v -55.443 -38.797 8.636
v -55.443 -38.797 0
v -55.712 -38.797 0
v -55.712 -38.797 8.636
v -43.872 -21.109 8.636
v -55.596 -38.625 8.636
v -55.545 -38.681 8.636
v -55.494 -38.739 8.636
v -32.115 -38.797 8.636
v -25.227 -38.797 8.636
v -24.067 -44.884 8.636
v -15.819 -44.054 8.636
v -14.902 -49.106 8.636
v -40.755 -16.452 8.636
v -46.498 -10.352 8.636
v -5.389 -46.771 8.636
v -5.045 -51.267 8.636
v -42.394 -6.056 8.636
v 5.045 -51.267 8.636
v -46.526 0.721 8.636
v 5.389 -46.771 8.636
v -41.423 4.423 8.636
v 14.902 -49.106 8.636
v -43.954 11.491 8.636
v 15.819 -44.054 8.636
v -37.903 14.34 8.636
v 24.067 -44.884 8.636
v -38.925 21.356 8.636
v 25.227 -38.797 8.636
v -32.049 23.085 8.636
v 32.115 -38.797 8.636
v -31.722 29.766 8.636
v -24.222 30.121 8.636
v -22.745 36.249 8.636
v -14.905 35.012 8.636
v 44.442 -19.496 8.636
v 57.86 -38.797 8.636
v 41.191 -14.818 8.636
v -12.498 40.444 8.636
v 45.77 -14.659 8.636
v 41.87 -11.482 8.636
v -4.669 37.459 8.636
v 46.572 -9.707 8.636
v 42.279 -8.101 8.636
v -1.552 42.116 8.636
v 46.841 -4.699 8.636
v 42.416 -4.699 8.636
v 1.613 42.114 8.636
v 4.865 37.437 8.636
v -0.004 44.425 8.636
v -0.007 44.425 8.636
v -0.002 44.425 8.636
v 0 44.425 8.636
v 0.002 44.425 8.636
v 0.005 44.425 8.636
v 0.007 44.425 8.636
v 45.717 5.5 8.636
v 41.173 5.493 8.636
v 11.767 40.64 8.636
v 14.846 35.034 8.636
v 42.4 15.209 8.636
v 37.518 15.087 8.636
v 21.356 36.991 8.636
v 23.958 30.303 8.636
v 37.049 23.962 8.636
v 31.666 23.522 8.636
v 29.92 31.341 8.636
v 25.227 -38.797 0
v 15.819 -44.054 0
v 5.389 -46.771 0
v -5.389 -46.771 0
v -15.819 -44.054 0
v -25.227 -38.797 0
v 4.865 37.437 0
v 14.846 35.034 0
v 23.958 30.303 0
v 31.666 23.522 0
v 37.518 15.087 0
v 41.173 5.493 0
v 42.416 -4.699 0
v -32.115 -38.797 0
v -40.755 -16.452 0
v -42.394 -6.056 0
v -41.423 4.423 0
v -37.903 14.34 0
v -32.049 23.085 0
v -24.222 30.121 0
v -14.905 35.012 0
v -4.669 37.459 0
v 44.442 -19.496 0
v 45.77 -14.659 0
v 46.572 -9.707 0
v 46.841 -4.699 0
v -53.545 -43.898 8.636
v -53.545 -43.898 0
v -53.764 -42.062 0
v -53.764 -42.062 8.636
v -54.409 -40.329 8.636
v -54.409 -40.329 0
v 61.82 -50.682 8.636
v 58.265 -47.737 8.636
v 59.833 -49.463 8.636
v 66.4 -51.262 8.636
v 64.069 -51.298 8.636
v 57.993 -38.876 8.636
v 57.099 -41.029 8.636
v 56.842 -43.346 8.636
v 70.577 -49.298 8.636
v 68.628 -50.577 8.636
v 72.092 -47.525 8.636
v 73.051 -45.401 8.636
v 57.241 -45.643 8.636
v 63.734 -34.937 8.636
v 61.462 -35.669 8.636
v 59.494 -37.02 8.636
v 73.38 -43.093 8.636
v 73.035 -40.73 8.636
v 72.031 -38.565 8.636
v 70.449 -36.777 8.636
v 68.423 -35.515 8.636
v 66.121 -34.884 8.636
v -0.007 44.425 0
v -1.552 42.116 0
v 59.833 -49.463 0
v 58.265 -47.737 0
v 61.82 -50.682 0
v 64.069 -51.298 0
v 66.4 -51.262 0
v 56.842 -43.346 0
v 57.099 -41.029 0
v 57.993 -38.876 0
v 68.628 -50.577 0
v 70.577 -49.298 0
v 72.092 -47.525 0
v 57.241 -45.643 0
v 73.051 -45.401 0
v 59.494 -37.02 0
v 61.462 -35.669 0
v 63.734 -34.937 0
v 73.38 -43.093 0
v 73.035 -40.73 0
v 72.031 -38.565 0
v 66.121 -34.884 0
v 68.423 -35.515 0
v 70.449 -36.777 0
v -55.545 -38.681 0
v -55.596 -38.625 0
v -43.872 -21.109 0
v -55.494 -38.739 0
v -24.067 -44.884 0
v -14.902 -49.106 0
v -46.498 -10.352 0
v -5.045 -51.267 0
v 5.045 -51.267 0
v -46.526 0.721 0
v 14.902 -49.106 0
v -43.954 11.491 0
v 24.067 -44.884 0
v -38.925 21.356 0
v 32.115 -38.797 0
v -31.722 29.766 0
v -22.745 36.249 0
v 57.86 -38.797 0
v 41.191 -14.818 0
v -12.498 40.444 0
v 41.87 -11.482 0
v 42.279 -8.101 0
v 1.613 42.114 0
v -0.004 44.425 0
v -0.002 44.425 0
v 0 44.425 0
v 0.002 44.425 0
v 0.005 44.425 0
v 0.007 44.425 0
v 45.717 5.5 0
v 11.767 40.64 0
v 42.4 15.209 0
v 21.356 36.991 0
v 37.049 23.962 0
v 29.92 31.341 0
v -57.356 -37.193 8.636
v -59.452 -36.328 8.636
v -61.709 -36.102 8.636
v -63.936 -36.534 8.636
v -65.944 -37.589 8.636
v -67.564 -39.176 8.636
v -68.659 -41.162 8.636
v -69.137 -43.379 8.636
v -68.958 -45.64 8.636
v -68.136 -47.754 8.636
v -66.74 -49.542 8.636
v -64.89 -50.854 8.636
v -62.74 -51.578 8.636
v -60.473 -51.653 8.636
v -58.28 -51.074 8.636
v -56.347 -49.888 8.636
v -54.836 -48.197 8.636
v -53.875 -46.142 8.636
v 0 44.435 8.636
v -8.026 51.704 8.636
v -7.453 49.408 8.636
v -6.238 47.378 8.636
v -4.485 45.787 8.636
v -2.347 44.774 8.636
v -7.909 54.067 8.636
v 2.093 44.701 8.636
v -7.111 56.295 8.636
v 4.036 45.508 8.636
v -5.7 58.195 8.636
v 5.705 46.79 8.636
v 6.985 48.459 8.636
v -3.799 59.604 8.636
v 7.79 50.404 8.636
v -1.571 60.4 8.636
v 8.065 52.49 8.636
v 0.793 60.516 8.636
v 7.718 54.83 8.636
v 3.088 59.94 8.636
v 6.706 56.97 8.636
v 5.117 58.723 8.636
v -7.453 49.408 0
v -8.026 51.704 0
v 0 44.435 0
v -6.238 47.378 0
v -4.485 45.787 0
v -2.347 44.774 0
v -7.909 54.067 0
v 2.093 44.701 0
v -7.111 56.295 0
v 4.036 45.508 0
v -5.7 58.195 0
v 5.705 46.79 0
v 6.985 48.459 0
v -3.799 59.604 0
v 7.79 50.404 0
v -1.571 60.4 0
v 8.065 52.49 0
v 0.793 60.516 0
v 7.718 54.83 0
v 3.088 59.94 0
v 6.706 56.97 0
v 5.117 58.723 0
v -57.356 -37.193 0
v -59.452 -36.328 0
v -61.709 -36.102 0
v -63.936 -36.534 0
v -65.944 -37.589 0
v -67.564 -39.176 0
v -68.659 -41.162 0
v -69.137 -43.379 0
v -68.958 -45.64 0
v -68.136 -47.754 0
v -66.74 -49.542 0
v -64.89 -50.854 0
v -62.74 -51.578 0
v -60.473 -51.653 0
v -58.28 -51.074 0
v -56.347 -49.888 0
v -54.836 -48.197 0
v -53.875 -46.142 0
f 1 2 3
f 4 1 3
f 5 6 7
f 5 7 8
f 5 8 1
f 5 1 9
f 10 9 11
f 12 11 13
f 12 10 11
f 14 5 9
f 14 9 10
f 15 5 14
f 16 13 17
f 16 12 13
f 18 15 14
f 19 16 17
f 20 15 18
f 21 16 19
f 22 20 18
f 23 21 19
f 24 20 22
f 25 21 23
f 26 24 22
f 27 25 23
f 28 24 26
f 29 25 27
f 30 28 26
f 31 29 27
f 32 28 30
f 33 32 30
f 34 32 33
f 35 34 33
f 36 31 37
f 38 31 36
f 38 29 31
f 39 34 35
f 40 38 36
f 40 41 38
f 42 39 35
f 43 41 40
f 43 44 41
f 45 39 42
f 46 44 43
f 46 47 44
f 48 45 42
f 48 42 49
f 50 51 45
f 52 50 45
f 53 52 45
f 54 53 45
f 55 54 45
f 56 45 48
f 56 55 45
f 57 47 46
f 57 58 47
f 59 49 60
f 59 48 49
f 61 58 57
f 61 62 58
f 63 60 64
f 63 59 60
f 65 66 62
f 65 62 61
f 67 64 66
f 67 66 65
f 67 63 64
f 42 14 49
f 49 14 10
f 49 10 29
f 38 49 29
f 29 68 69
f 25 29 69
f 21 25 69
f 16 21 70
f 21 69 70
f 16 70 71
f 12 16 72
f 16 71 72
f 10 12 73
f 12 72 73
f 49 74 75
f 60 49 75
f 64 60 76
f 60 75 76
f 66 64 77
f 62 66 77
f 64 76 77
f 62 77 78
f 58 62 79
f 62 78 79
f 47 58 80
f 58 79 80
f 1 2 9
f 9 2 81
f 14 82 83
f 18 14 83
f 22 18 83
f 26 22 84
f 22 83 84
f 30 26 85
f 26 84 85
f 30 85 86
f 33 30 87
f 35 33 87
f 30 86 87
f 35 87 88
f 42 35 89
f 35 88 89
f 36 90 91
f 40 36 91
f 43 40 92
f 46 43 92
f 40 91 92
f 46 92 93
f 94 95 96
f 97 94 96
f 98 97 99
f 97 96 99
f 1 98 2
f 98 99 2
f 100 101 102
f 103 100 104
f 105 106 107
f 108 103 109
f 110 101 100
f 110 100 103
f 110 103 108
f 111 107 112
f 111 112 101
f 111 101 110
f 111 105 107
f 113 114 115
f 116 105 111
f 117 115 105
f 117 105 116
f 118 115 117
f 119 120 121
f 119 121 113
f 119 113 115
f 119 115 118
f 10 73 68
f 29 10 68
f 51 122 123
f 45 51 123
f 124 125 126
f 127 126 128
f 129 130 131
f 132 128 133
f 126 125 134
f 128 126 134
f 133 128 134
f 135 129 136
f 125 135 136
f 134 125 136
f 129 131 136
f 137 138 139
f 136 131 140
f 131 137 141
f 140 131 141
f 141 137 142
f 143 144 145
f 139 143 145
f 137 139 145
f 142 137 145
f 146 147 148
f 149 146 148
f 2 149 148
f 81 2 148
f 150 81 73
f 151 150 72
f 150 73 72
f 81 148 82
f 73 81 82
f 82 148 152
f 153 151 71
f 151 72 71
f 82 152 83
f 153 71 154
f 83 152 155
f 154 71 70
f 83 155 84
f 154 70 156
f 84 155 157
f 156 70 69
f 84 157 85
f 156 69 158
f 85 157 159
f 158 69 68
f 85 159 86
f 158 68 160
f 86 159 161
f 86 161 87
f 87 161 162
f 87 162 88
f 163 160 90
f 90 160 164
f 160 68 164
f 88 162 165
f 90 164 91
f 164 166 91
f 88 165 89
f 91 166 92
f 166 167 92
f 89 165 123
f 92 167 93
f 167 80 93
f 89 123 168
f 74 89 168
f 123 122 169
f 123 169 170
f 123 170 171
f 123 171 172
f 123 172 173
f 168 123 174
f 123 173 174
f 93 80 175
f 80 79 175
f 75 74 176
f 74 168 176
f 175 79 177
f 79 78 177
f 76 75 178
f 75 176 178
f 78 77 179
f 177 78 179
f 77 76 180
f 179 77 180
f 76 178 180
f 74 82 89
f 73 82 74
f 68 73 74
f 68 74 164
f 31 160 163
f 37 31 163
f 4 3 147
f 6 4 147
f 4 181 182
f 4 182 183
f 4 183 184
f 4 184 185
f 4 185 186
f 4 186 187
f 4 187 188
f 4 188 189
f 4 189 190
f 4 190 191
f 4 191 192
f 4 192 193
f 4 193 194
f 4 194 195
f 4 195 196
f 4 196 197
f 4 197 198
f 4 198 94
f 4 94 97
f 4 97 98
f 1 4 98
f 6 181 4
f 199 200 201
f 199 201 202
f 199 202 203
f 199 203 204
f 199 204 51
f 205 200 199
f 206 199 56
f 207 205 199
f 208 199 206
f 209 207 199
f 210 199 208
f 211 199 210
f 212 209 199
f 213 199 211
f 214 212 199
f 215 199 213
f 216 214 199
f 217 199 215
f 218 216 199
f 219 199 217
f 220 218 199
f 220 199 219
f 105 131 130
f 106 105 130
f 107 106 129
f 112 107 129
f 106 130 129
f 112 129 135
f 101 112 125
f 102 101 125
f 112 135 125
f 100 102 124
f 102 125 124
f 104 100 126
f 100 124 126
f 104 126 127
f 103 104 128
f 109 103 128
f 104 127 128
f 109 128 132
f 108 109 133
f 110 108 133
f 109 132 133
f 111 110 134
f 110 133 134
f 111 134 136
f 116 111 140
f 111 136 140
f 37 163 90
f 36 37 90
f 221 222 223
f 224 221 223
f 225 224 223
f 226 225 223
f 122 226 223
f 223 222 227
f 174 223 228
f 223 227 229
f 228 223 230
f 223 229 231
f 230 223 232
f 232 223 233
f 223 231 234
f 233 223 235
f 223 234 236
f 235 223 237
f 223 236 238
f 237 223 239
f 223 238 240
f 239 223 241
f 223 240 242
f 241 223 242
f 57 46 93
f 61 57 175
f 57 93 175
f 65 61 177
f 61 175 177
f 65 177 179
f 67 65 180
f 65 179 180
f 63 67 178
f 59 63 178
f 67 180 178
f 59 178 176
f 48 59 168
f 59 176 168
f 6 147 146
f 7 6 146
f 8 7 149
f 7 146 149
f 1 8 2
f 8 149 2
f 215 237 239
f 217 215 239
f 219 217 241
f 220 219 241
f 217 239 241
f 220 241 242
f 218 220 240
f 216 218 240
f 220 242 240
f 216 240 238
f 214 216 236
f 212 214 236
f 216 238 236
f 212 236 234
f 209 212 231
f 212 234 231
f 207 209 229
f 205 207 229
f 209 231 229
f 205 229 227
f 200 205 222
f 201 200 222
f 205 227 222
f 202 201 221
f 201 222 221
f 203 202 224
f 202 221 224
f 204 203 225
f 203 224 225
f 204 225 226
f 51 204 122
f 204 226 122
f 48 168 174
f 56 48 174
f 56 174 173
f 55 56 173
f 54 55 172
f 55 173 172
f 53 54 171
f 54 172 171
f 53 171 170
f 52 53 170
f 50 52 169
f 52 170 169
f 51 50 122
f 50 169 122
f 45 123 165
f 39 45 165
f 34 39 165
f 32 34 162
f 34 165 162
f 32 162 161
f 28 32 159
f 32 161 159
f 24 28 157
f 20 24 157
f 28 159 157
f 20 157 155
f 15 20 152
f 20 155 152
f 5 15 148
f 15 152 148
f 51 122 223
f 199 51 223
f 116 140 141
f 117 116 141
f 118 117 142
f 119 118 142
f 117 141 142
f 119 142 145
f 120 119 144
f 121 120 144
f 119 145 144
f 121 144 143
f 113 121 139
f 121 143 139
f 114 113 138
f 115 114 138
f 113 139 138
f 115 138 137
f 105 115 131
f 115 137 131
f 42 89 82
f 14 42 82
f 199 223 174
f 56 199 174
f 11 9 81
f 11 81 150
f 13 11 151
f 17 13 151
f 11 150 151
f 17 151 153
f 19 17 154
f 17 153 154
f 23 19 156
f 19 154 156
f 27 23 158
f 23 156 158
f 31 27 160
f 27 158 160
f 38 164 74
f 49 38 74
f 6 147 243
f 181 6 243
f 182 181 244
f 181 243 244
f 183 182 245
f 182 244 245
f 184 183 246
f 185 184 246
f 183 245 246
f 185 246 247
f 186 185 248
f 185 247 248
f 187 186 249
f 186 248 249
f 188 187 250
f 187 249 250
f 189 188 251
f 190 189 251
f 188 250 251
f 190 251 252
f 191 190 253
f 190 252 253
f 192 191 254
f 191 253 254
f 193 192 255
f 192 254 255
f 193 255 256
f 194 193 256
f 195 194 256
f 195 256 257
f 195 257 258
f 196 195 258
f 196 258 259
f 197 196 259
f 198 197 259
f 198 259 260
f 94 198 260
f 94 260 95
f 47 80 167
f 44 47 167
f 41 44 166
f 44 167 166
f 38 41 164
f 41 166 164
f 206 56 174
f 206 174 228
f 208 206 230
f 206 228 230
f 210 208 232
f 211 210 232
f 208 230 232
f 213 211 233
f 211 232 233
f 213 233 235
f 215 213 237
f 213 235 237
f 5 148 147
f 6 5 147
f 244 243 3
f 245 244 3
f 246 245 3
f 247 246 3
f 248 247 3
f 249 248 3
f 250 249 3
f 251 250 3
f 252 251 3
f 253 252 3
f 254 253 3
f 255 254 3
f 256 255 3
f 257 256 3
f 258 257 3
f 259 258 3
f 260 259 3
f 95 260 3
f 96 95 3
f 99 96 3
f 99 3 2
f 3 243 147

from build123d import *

# Parameters (mm, degrees)
F1_DEPTH = 8.636


with BuildPart() as f1:
    # F0 (on Top) → F1 (new body)
    with BuildSketch(Plane.XY):
        with BuildLine():
            Line((0, 37.7170985419), (0, -38.7967973948))
            Line((0, -38.7967973948), (25.2269786209, -38.7967973948))
            ThreePointArc((25.2269786209, -38.7967973948), (35.3067853532, -28.2043221354), (41.1907481305, -14.8184333745))
            Line((41.1907481305, -14.8184333745), (4.8646492094, 37.437212041))
            ThreePointArc((4.8646492094, 37.437212041), (2.4363470803, 37.6470691064), (0, 37.7170985419))
        make_face()
        with BuildLine():
            ThreePointArc((-40.7548151647, -16.4516300475), (-34.8313925035, -28.9031889268), (-25.2269786209, -38.7967973948))
            Line((-25.2269786209, -38.7967973948), (0, -38.7967973948))
            Line((0, -38.7967973948), (0, 37.7170985419))
            ThreePointArc((0, 37.7170985419), (-2.3381891628, 37.6526024728), (-4.6692675573, 37.4593104073))
            Line((-4.6692675573, 37.4593104073), (-40.7548151647, -16.4516300475))
        make_face()
        with BuildLine():
            ThreePointArc((0, 42.1421492286), (-0.7761074517, 42.135719096), (-1.5520018207, 42.1164304636))
            Line((-1.5520018207, 42.1164304636), (-4.6692675573, 37.4593104073))
            ThreePointArc((-4.6692675573, 37.4593104073), (-2.3381891628, 37.6526024728), (0, 37.7170985419))
            Line((0, 37.7170985419), (0, 42.1421492286))
        make_face()
        with BuildLine():
            ThreePointArc((1.6132780308, 42.1143588987), (0.8067586856, 42.1352011308), (0, 42.1421492286))
            Line((0, 42.1421492286), (0, 37.7170985419))
            ThreePointArc((0, 37.7170985419), (2.4363470803, 37.6470691064), (4.8646492094, 37.437212041))
            Line((4.8646492094, 37.437212041), (1.6132780308, 42.1143588987))
        make_face()
        with BuildLine():
            Line((-0.006738286, 44.4250170288), (-1.5520018207, 42.1164304636))
            ThreePointArc((-1.5520018207, 42.1164304636), (-0.7761074517, 42.135719096), (0, 42.1421492286))
            Line((0, 42.1421492286), (0, 44.4250142138))
            ThreePointArc((0, 44.4250142138), (-0.0033691433, 44.4250149176), (-0.006738286, 44.4250170288))
        make_face()
        with BuildLine():
            Line((0, 44.4250142138), (0, 42.1421492286))
            ThreePointArc((0, 42.1421492286), (0.8067586856, 42.1352011308), (1.6132780308, 42.1143588987))
            Line((1.6132780308, 42.1143588987), (0.0069979213, 44.4250172499))
            ThreePointArc((0.0069979213, 44.4250172499), (0.003498961, 44.4250149728), (0, 44.4250142138))
        make_face()
        with BuildLine():
            Line((41.1907481305, -14.8184333745), (44.442119309, -19.4955802322))
            ThreePointArc((44.442119309, -19.4955802322), (46.237184027, -12.193650666), (46.8407233059, -4.6985740773))
            ThreePointArc((46.8407233059, -4.6985740773), (33.6869445756, 27.8474414235), (1.6132780308, 42.1143588987))
            Line((1.6132780308, 42.1143588987), (4.8646492094, 37.437212041))
            ThreePointArc((4.8646492094, 37.437212041), (31.6656489908, 23.5215598298), (42.4156726192, -4.6985740773))
            ThreePointArc((42.4156726192, -4.6985740773), (42.108327985, -9.7954356656), (41.1907481305, -14.8184333745))
        make_face()
        with BuildLine():
            Line((25.2269786209, -38.7967973948), (32.114864571, -38.7967973948))
            ThreePointArc((32.114864571, -38.7967973948), (39.4762864412, -29.9111933112), (44.442119309, -19.4955802322))
            Line((44.442119309, -19.4955802322), (41.1907481305, -14.8184333745))
            ThreePointArc((41.1907481305, -14.8184333745), (35.3067853532, -28.2043221354), (25.2269786209, -38.7967973948))
        make_face()
        with BuildLine():
            ThreePointArc((44.442119309, -19.4955802322), (39.4762864412, -29.9111933112), (32.114864571, -38.7967973948))
            Line((32.114864571, -38.7967973948), (46.3145114481, -38.7967973948))
            Line((46.3145114481, -38.7967973948), (57.8595772386, -38.7967973948))
            Line((57.8595772386, -38.7967973948), (44.442119309, -19.4955802322))
        make_face()
        with BuildLine():
            Line((-25.2269786209, -38.7967973948), (-32.114864571, -38.7967973948))
            ThreePointArc((-32.114864571, -38.7967973948), (0, -51.5392973832), (32.114864571, -38.7967973948))
            Line((32.114864571, -38.7967973948), (25.2269786209, -38.7967973948))
            ThreePointArc((25.2269786209, -38.7967973948), (0, -47.1142466966), (-25.2269786209, -38.7967973948))
        make_face()
        with BuildLine():
            ThreePointArc((-55.596394433, -38.6245926113), (-55.5191487672, -38.7101293299), (-55.443174629, -38.7967973948))
            Line((-55.443174629, -38.7967973948), (-32.114864571, -38.7967973948))
            ThreePointArc((-32.114864571, -38.7967973948), (-39.0092389671, -30.6279519146), (-43.8720809012, -21.1087501038))
            Line((-43.8720809012, -21.1087501038), (-55.596394433, -38.6245926113))
        make_face()
        with BuildLine():
            ThreePointArc((-43.8720809012, -21.1087501038), (-39.0092389671, -30.6279519146), (-32.114864571, -38.7967973948))
            Line((-32.114864571, -38.7967973948), (-25.2269786209, -38.7967973948))
            ThreePointArc((-25.2269786209, -38.7967973948), (-34.8313925035, -28.9031889268), (-40.7548151647, -16.4516300475))
            Line((-40.7548151647, -16.4516300475), (-43.8720809012, -21.1087501038))
        make_face()
        with BuildLine():
            ThreePointArc((-1.5520018207, 42.1164304636), (-38.9254760694, 21.3563807796), (-43.8720809012, -21.1087501038))
            Line((-43.8720809012, -21.1087501038), (-40.7548151647, -16.4516300475))
            ThreePointArc((-40.7548151647, -16.4516300475), (-35.2481800659, 18.8949649912), (-4.6692675573, 37.4593104073))
            Line((-4.6692675573, 37.4593104073), (-1.5520018207, 42.1164304636))
        make_face()
    extrude(amount=F1_DEPTH)


with BuildPart() as f1b:
    # F0 (on Top) → F1, piece 2 (new body)
    with BuildSketch(Plane.XY):
        with BuildLine():
            ThreePointArc((8.0647656758, 52.4897798896), (-5.7002676563, 58.1948122341), (-0.006738286, 44.4250170288))
            Line((-0.006738286, 44.4250170288), (0, 44.4350838661))
            Line((0, 44.4350838661), (0.0069979213, 44.4250172499))
            ThreePointArc((0.0069979213, 44.4250172499), (5.7051241003, 46.7896040673), (8.0647656758, 52.4897798896))
        make_face()
    extrude(amount=F1_DEPTH)


with BuildPart() as f1c:
    # F0 (on Top) → F1, piece 3 (new body)
    with BuildSketch(Plane.XY):
        with BuildLine():
            ThreePointArc((73.3798710813, -43.0926345289), (67.294847246, -35.1156895086), (57.9932896094, -38.8760342357))
            ThreePointArc((57.9932896094, -38.8760342357), (62.9227794449, -51.0695795491), (73.3798710813, -43.0926345289))
        make_face()
    extrude(amount=F1_DEPTH)


with BuildPart() as f1d:
    # F0 (on Top) → F1, piece 4 (new body)
    with BuildSketch(Plane.XY):
        with BuildLine():
            Line((-55.443174629, -38.7967973948), (-55.7116605341, -38.7967973948))
            Line((-55.7116605341, -38.7967973948), (-55.596394433, -38.6245926113))
            ThreePointArc((-55.596394433, -38.6245926113), (-68.6238126047, -46.7272897755), (-53.5452502536, -43.8981056213))
            ThreePointArc((-53.5452502536, -43.8981056213), (-54.0351039177, -41.1766417433), (-55.443174629, -38.7967973948))
        make_face()
    extrude(amount=F1_DEPTH)


solid = Compound([f1.part, f1b.part, f1c.part, f1d.part])
